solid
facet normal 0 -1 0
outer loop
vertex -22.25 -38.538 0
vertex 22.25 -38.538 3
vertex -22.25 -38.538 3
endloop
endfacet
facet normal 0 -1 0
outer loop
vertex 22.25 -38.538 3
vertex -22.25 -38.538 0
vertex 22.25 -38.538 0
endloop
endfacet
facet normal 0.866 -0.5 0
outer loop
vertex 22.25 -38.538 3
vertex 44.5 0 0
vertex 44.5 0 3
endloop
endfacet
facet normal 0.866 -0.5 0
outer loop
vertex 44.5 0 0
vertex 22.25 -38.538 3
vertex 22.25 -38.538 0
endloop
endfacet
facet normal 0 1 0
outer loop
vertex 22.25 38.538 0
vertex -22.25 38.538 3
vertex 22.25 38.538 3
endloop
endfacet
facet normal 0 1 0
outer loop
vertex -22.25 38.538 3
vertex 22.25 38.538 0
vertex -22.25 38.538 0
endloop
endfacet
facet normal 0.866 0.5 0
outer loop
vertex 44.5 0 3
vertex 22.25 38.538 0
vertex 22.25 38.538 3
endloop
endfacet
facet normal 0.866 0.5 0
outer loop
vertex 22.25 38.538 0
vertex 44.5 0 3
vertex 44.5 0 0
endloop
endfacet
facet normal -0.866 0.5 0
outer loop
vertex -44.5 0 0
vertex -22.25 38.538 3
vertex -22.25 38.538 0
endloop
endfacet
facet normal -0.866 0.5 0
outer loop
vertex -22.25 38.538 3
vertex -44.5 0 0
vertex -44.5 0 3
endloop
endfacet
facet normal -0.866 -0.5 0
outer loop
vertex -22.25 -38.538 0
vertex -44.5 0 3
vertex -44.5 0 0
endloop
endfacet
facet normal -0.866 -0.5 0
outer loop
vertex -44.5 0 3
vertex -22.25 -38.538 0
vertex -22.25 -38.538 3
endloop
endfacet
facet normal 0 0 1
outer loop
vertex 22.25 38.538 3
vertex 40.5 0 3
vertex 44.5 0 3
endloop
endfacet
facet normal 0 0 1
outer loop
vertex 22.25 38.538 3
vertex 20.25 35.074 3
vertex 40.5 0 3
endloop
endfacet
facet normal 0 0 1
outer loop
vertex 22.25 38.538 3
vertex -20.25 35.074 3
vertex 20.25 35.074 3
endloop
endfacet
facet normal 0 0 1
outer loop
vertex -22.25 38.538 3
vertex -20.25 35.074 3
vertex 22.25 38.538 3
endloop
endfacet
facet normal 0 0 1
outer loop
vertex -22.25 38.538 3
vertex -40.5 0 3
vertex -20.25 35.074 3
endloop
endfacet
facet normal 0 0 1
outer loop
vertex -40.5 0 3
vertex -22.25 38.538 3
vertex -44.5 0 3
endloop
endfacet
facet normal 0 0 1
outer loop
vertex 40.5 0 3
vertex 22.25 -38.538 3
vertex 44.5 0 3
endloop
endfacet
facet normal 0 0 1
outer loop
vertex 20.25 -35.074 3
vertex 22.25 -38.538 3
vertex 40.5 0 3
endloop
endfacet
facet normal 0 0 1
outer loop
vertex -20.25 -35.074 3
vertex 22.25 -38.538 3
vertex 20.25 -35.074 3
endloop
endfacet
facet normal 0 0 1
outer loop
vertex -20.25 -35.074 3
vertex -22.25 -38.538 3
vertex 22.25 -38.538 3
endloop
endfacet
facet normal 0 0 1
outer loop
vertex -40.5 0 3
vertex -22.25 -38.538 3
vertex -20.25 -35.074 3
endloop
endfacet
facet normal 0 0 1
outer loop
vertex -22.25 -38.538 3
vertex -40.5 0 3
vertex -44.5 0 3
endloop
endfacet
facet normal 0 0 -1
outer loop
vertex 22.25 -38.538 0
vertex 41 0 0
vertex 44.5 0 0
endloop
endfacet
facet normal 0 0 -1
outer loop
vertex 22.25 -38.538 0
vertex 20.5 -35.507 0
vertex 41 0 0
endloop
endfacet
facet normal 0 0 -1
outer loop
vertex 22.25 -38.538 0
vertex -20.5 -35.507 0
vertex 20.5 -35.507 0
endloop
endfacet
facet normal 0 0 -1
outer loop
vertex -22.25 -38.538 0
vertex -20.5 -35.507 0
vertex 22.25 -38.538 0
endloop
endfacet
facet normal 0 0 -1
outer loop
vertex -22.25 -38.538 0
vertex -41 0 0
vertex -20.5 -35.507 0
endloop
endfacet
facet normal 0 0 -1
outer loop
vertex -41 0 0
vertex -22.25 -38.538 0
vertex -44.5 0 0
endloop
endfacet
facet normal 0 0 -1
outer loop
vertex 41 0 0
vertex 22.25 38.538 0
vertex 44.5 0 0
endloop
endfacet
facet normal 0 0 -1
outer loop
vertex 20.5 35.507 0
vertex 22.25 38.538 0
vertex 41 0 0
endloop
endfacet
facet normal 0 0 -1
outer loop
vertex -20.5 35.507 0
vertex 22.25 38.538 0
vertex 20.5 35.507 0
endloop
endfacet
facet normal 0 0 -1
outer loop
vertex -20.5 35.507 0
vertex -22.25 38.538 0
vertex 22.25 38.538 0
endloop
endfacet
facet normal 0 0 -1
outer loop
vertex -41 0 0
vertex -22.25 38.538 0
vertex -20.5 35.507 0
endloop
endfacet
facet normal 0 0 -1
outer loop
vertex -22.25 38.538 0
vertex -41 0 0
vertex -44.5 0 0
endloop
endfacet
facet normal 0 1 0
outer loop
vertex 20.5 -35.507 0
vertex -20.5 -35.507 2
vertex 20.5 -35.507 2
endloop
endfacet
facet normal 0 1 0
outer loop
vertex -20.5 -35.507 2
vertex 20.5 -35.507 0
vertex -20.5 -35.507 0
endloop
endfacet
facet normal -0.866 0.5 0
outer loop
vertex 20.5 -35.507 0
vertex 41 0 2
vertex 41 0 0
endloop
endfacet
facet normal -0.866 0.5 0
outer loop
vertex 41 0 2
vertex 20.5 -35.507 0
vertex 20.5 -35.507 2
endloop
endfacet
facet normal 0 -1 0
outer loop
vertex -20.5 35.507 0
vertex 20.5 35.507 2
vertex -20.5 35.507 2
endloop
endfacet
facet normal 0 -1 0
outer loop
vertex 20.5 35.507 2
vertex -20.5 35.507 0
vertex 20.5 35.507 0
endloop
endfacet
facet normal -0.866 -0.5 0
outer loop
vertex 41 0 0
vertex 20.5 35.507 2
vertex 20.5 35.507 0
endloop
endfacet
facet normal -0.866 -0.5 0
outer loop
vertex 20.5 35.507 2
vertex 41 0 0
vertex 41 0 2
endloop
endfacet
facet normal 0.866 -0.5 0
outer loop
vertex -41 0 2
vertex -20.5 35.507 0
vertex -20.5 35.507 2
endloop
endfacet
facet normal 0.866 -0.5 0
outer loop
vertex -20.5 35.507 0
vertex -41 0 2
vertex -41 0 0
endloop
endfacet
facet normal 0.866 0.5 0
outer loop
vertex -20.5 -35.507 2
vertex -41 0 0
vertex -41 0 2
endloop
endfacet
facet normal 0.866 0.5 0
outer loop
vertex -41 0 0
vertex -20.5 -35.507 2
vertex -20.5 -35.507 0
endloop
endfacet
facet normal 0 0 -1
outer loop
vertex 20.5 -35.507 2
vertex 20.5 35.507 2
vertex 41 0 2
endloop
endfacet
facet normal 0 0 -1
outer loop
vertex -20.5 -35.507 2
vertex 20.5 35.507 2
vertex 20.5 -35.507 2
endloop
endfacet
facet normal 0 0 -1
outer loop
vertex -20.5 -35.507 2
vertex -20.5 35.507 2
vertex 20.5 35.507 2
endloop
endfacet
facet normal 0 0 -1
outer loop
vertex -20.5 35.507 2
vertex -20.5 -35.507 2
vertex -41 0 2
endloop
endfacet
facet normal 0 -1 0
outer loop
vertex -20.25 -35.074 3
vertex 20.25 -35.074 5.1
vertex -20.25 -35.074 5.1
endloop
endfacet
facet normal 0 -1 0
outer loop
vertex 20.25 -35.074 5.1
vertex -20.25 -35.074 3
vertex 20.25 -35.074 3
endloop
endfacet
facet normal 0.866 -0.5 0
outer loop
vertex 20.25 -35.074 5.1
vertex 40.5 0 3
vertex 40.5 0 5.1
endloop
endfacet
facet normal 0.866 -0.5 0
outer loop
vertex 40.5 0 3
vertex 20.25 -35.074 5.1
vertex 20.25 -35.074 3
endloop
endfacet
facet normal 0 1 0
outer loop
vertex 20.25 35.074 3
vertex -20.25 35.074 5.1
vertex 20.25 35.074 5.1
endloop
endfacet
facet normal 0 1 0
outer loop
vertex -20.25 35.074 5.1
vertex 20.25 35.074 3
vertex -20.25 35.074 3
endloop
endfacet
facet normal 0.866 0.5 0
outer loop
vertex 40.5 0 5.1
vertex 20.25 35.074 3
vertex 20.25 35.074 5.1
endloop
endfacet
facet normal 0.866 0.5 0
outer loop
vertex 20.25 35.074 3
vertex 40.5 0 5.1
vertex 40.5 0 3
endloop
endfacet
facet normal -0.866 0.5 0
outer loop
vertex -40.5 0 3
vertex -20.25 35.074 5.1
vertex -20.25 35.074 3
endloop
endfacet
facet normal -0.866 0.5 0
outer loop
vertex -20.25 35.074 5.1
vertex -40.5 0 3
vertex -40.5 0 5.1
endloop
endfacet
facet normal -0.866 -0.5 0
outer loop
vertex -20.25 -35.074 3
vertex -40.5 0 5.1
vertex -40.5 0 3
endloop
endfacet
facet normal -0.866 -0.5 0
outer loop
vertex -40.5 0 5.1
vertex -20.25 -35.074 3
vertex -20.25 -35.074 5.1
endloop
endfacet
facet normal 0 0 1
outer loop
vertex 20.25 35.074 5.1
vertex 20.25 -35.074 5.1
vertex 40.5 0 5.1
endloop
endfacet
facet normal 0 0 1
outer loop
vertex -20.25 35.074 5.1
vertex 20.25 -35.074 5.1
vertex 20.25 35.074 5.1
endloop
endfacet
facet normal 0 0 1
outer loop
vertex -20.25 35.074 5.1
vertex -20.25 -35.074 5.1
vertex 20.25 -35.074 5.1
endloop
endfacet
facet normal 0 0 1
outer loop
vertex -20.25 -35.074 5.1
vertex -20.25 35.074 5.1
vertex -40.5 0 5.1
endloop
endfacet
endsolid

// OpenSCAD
module hexagon(d=10, h=10) {
    cylinder(d=d, h=h, $fn=6);
}

module catan_tile() {
    diameter = 89;
    max_road_width = 8;
    inner_diameter = diameter - max_road_width;

    difference() {
        hexagon(d=89, h=3);
        translate([0, 0, -0.1]) hexagon(d=inner_diameter + 1, h=2.1);
    }

    translate([0, 0, 3]) hexagon(d=inner_diameter, h=2.1);
}

catan_tile();
